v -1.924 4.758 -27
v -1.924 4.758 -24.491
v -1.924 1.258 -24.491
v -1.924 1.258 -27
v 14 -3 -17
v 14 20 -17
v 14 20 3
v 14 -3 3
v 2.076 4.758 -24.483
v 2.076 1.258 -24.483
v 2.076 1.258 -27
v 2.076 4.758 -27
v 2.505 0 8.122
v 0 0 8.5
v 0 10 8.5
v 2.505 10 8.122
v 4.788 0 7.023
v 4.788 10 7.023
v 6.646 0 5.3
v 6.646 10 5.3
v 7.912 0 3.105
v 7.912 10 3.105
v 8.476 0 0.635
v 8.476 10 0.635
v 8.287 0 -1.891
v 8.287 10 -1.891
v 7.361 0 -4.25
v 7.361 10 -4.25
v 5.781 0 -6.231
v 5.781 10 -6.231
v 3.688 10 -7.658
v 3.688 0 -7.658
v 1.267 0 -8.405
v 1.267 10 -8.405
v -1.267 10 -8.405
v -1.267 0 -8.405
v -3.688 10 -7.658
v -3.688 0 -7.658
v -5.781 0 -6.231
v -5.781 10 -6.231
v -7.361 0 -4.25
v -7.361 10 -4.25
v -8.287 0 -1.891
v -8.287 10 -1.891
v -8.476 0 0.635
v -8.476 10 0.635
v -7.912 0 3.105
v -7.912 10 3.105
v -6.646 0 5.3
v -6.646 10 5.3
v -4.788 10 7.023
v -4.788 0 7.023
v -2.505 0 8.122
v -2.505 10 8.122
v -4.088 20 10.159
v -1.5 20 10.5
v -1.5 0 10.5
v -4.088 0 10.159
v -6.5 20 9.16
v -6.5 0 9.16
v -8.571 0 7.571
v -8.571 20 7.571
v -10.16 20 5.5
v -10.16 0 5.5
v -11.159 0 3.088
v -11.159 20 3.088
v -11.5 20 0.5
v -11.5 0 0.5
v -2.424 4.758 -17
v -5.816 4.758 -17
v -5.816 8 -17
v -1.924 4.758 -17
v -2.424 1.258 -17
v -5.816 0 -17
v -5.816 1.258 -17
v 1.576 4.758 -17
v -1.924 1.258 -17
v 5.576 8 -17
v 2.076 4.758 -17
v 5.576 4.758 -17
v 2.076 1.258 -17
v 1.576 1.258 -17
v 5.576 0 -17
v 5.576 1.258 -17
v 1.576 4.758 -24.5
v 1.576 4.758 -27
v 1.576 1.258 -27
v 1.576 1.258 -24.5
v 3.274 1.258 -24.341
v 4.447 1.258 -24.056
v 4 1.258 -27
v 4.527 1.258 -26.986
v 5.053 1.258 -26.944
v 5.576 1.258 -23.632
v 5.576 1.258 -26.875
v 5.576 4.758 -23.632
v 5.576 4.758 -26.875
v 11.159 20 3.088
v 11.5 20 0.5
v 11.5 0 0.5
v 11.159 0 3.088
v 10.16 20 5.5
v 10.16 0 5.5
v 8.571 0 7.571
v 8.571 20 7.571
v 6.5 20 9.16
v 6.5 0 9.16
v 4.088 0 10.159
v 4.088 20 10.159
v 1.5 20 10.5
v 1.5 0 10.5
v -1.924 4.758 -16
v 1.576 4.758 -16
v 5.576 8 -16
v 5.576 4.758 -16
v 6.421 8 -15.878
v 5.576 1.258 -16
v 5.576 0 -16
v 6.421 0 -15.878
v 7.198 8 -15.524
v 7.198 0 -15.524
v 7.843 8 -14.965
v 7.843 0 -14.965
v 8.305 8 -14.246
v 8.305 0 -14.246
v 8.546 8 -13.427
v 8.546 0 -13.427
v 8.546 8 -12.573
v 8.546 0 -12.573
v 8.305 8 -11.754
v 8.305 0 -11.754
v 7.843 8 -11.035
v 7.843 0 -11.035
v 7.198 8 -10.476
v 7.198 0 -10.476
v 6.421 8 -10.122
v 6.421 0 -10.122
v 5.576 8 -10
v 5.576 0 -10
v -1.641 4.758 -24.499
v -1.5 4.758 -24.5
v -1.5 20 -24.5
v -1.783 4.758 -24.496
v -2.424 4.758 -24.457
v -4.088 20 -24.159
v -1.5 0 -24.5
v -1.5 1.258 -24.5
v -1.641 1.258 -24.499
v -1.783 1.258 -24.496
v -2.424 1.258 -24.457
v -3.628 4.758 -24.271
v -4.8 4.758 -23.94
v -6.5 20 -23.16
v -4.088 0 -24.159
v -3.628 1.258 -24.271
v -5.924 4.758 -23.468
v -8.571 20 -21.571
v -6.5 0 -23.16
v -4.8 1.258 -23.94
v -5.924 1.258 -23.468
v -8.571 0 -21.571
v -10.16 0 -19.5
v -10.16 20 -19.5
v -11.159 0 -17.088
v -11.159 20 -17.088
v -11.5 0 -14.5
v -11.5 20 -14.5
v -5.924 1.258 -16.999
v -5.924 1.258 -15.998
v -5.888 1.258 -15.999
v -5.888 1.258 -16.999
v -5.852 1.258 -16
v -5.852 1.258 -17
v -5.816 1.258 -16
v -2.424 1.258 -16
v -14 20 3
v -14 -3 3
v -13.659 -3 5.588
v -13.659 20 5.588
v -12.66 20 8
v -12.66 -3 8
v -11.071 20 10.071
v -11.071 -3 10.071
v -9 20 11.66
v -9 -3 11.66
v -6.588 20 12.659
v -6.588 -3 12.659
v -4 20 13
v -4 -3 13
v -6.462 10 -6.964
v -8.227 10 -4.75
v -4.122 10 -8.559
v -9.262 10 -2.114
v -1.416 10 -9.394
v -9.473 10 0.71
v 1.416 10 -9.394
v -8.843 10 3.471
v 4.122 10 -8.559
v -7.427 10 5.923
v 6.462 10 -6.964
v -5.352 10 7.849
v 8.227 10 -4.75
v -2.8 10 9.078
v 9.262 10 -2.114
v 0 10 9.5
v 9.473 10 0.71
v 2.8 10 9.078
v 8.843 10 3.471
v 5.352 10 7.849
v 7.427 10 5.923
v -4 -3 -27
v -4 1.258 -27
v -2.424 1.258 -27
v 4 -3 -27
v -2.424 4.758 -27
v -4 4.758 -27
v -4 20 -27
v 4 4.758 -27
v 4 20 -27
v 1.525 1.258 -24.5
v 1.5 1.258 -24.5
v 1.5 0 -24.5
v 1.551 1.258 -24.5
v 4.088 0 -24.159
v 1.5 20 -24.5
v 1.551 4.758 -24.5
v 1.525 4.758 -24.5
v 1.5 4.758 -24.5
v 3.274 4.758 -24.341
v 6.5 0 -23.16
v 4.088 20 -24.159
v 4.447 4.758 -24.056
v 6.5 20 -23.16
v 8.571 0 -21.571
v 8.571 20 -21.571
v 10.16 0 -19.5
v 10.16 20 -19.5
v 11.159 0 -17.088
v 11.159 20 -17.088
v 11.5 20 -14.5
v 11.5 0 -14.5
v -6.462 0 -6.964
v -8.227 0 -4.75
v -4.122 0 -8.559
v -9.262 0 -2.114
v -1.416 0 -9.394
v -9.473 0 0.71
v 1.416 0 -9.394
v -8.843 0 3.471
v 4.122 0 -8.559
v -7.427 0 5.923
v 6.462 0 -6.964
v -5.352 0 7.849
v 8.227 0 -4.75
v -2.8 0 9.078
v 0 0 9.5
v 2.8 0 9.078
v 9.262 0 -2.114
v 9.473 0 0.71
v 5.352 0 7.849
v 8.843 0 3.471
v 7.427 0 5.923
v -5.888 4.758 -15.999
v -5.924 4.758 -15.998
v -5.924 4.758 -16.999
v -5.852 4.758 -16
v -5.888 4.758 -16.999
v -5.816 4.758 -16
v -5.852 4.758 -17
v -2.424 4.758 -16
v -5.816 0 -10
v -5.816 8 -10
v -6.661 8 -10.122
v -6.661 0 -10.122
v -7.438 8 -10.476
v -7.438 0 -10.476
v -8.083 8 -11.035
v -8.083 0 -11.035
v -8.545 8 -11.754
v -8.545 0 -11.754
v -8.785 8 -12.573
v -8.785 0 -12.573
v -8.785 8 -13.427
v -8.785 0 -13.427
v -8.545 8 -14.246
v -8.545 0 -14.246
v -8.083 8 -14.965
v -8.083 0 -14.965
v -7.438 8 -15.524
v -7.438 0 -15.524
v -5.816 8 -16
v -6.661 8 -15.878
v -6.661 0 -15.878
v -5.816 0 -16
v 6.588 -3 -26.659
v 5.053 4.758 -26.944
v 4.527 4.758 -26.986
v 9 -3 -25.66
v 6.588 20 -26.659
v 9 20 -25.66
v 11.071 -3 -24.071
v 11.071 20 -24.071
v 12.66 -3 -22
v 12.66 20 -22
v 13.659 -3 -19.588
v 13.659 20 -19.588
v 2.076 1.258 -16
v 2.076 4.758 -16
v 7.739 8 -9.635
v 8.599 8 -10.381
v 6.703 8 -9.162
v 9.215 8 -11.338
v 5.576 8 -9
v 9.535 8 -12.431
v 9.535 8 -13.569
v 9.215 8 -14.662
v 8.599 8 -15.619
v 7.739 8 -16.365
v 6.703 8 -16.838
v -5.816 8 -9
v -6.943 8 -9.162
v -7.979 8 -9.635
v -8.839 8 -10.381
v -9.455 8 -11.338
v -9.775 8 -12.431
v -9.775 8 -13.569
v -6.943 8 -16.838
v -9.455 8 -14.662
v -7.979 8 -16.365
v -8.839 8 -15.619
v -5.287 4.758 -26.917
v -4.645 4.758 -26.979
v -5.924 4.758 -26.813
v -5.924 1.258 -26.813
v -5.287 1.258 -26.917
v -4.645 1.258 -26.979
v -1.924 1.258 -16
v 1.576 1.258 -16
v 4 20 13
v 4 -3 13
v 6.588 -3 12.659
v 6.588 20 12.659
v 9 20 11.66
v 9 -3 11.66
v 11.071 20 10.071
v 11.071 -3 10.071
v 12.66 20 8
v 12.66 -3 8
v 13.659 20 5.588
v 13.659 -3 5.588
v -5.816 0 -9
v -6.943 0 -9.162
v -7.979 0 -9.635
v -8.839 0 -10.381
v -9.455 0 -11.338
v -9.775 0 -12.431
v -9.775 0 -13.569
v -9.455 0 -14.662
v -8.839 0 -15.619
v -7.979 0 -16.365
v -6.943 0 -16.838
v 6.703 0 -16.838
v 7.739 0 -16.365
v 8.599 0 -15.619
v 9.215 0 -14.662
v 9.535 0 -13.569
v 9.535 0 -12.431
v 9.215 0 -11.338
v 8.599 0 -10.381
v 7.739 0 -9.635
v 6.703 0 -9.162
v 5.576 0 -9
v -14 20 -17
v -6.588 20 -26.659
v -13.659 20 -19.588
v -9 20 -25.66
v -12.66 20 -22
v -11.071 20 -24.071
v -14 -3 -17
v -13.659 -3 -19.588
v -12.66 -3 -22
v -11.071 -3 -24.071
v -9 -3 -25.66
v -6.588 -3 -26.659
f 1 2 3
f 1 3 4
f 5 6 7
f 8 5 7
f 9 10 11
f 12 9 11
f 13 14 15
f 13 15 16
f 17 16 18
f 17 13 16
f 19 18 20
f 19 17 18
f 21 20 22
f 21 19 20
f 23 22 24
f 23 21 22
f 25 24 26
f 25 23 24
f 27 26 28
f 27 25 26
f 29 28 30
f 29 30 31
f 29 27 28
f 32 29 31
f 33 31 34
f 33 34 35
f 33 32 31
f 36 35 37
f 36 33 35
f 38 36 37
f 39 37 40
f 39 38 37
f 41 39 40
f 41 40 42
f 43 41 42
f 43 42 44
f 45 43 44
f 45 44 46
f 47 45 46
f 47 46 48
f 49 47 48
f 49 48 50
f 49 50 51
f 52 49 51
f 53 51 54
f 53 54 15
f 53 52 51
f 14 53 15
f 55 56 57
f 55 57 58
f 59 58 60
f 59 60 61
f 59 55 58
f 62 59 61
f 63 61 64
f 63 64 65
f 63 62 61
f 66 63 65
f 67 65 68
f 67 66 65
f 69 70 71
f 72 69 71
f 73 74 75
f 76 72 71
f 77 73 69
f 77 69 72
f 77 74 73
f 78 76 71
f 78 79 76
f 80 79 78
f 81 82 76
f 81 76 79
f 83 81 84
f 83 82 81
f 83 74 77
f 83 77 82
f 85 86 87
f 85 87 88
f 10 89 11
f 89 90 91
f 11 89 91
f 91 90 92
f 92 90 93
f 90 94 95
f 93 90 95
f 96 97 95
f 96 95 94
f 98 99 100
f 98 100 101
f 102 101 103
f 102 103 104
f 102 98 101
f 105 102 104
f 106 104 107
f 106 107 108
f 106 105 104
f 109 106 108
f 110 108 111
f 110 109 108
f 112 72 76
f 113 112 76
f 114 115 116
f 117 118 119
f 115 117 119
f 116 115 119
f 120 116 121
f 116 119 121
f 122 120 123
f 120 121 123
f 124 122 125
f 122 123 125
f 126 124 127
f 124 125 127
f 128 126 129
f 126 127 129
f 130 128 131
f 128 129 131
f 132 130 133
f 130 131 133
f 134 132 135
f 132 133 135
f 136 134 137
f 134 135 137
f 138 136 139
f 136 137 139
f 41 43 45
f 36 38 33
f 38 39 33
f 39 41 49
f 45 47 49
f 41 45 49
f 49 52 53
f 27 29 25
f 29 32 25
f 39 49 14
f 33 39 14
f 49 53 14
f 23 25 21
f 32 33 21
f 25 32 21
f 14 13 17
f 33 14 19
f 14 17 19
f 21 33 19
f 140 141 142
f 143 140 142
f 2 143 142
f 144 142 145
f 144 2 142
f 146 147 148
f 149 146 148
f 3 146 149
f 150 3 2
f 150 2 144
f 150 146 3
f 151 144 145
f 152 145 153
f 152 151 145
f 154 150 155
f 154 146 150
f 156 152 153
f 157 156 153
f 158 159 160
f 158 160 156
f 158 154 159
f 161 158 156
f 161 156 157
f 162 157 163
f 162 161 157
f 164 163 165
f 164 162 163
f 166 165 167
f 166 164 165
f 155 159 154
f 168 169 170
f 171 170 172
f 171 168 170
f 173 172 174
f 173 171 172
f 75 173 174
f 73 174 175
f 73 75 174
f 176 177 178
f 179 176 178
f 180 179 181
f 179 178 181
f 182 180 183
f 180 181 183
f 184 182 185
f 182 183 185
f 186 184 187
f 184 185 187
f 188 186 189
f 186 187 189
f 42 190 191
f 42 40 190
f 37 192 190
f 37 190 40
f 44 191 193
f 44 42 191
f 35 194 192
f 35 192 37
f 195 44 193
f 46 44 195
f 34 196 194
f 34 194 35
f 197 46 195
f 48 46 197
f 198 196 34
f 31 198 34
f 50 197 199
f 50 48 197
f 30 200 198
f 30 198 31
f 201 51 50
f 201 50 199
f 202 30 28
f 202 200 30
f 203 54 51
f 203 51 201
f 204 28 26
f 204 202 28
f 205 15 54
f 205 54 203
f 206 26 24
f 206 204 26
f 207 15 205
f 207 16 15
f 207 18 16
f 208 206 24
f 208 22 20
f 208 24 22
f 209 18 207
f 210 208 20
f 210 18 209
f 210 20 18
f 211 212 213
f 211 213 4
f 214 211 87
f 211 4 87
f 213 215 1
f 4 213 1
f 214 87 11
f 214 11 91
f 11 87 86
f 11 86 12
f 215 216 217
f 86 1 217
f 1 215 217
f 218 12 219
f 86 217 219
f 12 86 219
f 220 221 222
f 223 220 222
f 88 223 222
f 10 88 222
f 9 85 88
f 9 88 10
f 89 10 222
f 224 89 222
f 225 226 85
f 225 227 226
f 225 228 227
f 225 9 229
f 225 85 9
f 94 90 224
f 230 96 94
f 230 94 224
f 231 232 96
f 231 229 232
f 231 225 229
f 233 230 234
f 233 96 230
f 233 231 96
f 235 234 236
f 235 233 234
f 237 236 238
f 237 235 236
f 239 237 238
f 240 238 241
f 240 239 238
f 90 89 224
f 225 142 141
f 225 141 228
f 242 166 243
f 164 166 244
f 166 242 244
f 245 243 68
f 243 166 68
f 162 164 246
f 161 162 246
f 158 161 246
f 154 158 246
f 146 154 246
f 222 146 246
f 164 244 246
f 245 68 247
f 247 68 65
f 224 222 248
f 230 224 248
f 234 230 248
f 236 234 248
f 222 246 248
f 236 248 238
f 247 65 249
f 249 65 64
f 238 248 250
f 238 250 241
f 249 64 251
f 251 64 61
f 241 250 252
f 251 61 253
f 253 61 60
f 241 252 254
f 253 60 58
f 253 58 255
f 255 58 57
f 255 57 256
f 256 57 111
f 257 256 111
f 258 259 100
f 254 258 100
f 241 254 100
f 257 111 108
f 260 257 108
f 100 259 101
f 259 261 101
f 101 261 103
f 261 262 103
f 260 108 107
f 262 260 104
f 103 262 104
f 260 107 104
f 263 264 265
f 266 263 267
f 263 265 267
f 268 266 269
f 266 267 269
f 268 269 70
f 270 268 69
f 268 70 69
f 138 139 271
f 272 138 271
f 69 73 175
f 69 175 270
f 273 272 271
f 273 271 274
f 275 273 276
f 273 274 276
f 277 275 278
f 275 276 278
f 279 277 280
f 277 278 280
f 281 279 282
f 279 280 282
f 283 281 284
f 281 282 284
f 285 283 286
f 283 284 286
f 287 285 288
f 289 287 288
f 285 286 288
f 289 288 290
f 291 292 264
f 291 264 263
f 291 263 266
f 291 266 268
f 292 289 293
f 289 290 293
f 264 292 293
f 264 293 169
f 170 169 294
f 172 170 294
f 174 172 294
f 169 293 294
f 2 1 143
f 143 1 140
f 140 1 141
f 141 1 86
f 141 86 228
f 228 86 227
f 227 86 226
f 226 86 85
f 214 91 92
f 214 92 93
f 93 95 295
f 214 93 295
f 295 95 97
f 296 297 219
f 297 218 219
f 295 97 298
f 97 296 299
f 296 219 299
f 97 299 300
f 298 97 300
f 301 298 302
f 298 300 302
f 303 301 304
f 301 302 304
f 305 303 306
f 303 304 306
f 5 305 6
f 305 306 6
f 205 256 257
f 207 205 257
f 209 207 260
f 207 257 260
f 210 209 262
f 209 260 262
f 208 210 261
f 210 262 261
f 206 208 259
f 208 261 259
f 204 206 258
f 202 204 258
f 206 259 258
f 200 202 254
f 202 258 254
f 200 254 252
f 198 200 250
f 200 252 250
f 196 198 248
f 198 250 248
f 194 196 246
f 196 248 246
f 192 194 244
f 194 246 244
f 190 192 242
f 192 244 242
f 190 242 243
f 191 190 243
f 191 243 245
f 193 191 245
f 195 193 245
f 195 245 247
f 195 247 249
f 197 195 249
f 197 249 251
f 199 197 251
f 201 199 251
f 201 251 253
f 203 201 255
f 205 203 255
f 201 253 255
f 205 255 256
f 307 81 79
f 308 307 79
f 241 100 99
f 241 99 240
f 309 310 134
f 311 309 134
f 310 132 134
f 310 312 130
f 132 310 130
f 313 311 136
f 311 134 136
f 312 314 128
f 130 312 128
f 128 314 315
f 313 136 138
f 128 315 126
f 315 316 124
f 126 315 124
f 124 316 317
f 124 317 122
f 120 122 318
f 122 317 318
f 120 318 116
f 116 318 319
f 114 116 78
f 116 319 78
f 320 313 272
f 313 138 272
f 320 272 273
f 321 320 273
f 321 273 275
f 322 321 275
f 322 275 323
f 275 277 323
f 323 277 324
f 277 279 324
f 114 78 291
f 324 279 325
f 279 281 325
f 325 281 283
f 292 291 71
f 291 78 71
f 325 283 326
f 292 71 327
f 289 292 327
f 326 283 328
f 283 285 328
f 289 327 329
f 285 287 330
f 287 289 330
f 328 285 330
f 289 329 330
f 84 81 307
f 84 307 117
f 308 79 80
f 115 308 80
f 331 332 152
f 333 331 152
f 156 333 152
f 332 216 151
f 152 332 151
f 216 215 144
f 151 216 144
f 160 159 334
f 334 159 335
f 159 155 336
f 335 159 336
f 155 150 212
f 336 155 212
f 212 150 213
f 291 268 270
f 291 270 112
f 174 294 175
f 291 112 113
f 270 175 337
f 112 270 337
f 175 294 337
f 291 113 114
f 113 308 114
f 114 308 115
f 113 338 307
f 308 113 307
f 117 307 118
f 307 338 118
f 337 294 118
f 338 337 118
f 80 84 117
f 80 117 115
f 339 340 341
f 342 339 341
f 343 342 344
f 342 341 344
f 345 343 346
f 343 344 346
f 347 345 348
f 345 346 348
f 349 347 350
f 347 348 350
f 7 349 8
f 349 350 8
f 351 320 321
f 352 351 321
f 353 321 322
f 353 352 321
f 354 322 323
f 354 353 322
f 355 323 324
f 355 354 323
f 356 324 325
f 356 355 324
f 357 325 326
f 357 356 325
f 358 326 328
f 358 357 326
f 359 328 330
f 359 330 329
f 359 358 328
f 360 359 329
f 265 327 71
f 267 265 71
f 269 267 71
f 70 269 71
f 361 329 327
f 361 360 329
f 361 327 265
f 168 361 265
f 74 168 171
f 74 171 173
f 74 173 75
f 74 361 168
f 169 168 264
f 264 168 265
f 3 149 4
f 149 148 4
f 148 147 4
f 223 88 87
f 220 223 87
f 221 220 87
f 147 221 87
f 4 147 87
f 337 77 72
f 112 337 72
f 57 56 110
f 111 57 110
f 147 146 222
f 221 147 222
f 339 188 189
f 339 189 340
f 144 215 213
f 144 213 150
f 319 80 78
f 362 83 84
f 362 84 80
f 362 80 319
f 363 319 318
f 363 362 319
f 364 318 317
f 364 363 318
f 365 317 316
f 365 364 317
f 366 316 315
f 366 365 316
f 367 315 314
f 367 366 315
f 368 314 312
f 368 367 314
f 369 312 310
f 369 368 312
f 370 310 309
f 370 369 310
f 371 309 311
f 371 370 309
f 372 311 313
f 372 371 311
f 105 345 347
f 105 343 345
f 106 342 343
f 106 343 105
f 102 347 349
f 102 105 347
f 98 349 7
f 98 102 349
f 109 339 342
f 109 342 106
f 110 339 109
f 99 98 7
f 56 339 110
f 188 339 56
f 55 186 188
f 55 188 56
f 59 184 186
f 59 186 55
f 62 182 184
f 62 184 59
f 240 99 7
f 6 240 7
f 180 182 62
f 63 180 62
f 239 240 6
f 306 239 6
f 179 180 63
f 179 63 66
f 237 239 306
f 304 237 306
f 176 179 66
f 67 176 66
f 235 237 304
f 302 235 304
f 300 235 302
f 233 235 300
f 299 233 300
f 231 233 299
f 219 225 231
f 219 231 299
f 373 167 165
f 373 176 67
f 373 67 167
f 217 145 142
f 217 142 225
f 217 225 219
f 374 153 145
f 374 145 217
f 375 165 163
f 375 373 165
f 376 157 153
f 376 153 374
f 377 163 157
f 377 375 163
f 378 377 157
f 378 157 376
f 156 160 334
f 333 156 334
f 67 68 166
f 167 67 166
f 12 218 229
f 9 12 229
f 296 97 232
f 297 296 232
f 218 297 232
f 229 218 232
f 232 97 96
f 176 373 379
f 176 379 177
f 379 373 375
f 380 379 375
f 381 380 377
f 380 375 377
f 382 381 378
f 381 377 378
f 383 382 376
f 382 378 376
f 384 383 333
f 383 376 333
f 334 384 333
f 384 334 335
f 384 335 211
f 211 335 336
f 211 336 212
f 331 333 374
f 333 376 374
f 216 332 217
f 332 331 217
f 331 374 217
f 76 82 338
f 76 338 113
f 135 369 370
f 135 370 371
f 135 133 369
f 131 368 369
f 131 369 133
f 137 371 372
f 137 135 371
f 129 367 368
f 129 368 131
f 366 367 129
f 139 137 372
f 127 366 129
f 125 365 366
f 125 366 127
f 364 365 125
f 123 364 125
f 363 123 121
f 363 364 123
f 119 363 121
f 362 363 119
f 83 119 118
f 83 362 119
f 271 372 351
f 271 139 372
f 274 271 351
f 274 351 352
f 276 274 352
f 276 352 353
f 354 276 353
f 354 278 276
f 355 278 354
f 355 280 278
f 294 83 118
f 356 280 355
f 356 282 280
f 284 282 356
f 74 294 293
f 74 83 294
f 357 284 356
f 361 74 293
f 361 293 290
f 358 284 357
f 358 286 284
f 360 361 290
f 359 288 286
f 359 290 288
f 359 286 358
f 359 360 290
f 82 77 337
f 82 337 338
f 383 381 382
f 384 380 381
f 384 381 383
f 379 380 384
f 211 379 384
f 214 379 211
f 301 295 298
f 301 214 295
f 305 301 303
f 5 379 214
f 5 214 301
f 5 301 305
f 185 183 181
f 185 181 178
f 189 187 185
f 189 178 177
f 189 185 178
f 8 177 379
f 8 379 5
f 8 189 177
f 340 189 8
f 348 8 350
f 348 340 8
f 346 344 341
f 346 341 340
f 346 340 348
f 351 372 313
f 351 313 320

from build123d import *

# Parameters (mm, degrees)
SKETCH1_W               = 28
SKETCH1_H               = 40
SKETCH1_W_2             = 23
SKETCH1_H_2             = 35
BOSS_EXTRUDE4_DEPTH     = 10
SKETCH1_R               = 9.5
SKETCH1_R_2             = 8.5
BOSS_EXTRUDE4_2_DEPTH   = 10
SKETCH1_5_W             = 28
SKETCH1_5_H             = 40
SKETCH1_5_W_2           = 23
SKETCH1_5_H_2           = 35
BOSS_EXTRUDE5_DEPTH     = 20
SKETCH3_W               = 28
SKETCH3_H               = 40
BOSS_EXTRUDE6_DEPTH     = 3
BOSS_EXTRUDE9_DEPTH     = 8
CUT_EXTRUDE2_DEPTH      = 11
CUT_EXTRUDE2_DEPTH_BACK = 8
SKETCH6_W               = 3.5
SKETCH6_H               = 3.5
FILLET1_R               = 10


with BuildPart() as part:
    # Sketch1 → Boss-Extrude4 (new body)
    with BuildSketch(Plane(origin=(0, 0, 0), x_dir=(1, 0, 0), z_dir=(0, 1, 0))):
        with Locations((0, 7)):
            Rectangle(SKETCH1_W, SKETCH1_H)
        with Locations((0, 7)):
            Rectangle(SKETCH1_W_2, SKETCH1_H_2, mode=Mode.SUBTRACT)
    extrude(amount=BOSS_EXTRUDE4_DEPTH)

    # Sketch1<5> → Boss-Extrude5 (add)
    with BuildSketch(Plane(origin=(0, 0, 0), x_dir=(1, 0, 0), z_dir=(0, 1, 0))):
        with Locations((0, 7)):
            Rectangle(SKETCH1_5_W, SKETCH1_5_H)
        with Locations((0, 7)):
            Rectangle(SKETCH1_5_W_2, SKETCH1_5_H_2, mode=Mode.SUBTRACT)
    extrude(amount=BOSS_EXTRUDE5_DEPTH)



with BuildPart() as body_2:
    # Sketch1 → Boss-Extrude4 2 (new body)
    with BuildSketch(Plane(origin=(0, 0, 0), x_dir=(1, 0, 0), z_dir=(0, 1, 0))):
        with Locations(Location((0, 0, 0), (0, 0, 270))):
            Circle(SKETCH1_R)
        with Locations(Location((0, 0, 0), (0, 0, 270))):
            Circle(SKETCH1_R_2, mode=Mode.SUBTRACT)
    extrude(amount=BOSS_EXTRUDE4_2_DEPTH)


with BuildPart() as part_1:
    add(part.part)

    add(body_2.part)  # Boss-Extrude6 merges body 2
    # Sketch3 → Boss-Extrude6 (add)
    with BuildSketch(Plane.XZ):
        with Locations((0, -7)):
            Rectangle(SKETCH3_W, SKETCH3_H)
    extrude(amount=BOSS_EXTRUDE6_DEPTH)


with BuildPart() as body_2_2:
    # Sketch4 → Boss-Extrude9 (new body)
    with BuildSketch(Plane(origin=(0, 0, 0), x_dir=(1, 0, 0), z_dir=(0, 1, 0))):
        with BuildLine():
            Line((-5.815986723, 17), (5.576152219, 17))
            ThreePointArc((5.576152219, 17), (9.576152219, 13), (5.576152219, 9))
            Line((5.576152219, 9), (-5.815986723, 9))
            ThreePointArc((-5.815986723, 9), (-9.815986723, 13), (-5.815986723, 17))
        make_face()
        with BuildLine():
            Line((-5.815986723, 16), (5.576152219, 16))
            ThreePointArc((5.576152219, 16), (8.576152219, 13), (5.576152219, 10))
            Line((5.576152219, 10), (-5.815986723, 10))
            ThreePointArc((-5.815986723, 10), (-8.815986723, 13), (-5.815986723, 16))
        make_face(mode=Mode.SUBTRACT)
    extrude(amount=BOSS_EXTRUDE9_DEPTH)


with BuildPart() as cut_extrude2_tool:
    # Sketch6 → Cut-Extrude2 (new, two sides: drawn at the far end of the back side and taken through both)
    with BuildSketch(Plane.XY.offset(-24.5).offset(-CUT_EXTRUDE2_DEPTH_BACK)):
        with Locations((3.826152219, 3.007864186)):
            Rectangle(SKETCH6_W, SKETCH6_H)
        with Locations((-0.173847781, 3.007864186)):
            Rectangle(SKETCH6_W, SKETCH6_H)
        with Locations((-4.173847781, 3.007864186)):
            Rectangle(SKETCH6_W, SKETCH6_H)
    extrude(amount=CUT_EXTRUDE2_DEPTH + CUT_EXTRUDE2_DEPTH_BACK)


with BuildPart() as part_2:
    add(part_1.part)

    # Cut-Extrude2: cut by cut_extrude2_tool
    add(cut_extrude2_tool.part, mode=Mode.SUBTRACT)

    # Fillet1
    # the kernel refuses this fillet: 10 mm, written as the material it adds along each edge
    with BuildSketch(Plane(origin=(-11.5, 20, 10.5), x_dir=(0, 0, -1), z_dir=(0, -1, 0)), Plane(origin=(11.5, 20, 10.5), x_dir=(-1, 0, 0), z_dir=(0, -1, 0))) as fillet1_piece_1:
        with BuildLine():
            CenterArc((FILLET1_R, FILLET1_R), FILLET1_R, 180, 90)
            Line((0, FILLET1_R), (0, 0))
            Line((0, 0), (FILLET1_R, 0))
        make_face()
    extrude(amount=20)
    with BuildSketch(Plane(origin=(11.5, 20, -24.5), x_dir=(0, 0, 1), z_dir=(0, -1, 0))) as fillet1_piece_2_section:
        with BuildLine():
            CenterArc((FILLET1_R, FILLET1_R), FILLET1_R, 180, 90)
            Line((0, FILLET1_R), (0, 0))
            Line((0, 0), (FILLET1_R, 0))
        make_face()
    fillet1_piece_2 = extrude(amount=45, mode=Mode.PRIVATE)
    fillet1_piece_2 = split(fillet1_piece_2, bisect_by=Plane(origin=(9.534581137, 4.757864186, -22.153586086), z_dir=(0, 1, 0)), keep=Keep.TOP, mode=Mode.PRIVATE)
    add(fillet1_piece_2)
    with BuildSketch(Plane(origin=(11.5, 45, -24.5), x_dir=(0, 0, 1), z_dir=(0, -1, 0))) as fillet1_piece_3_section:
        with BuildLine():
            CenterArc((FILLET1_R, FILLET1_R), FILLET1_R, 180, 90)
            Line((0, FILLET1_R), (0, 0))
            Line((0, 0), (FILLET1_R, 0))
        make_face()
    fillet1_piece_3 = extrude(amount=45, mode=Mode.PRIVATE)
    fillet1_piece_3 = split(fillet1_piece_3, bisect_by=Plane(origin=(9.534581137, 4.757864186, -22.153586086), z_dir=(0, -1, 0)), keep=Keep.TOP, mode=Mode.PRIVATE)
    fillet1_piece_3 = split(fillet1_piece_3, bisect_by=Plane(origin=(5.576152219, 3.007864186, -22.153586086), z_dir=(1, 0, 0)), keep=Keep.TOP, mode=Mode.PRIVATE)
    add(fillet1_piece_3)
    with BuildSketch(Plane(origin=(11.5, 45, -24.5), x_dir=(0, 0, 1), z_dir=(0, -1, 0))) as fillet1_piece_4_section:
        with BuildLine():
            CenterArc((FILLET1_R, FILLET1_R), FILLET1_R, 180, 90)
            Line((0, FILLET1_R), (0, 0))
            Line((0, 0), (FILLET1_R, 0))
        make_face()
    fillet1_piece_4 = extrude(amount=45, mode=Mode.PRIVATE)
    fillet1_piece_4 = split(fillet1_piece_4, bisect_by=Plane(origin=(1.933005634, 4.757864186, -24.495005975), z_dir=(0, -1, 0)), keep=Keep.TOP, mode=Mode.PRIVATE)
    fillet1_piece_4 = split(fillet1_piece_4, bisect_by=Plane(origin=(2.076152219, 3.007864186, -24.495005975), z_dir=(-1, 0, 0)), keep=Keep.TOP, mode=Mode.PRIVATE)
    fillet1_piece_4 = split(fillet1_piece_4, bisect_by=Plane(origin=(1.576152219, 3.007864186, -24.495005975), z_dir=(1, 0, 0)), keep=Keep.TOP, mode=Mode.PRIVATE)
    add(fillet1_piece_4)
    with BuildSketch(Plane(origin=(11.5, 45, -24.5), x_dir=(0, 0, 1), z_dir=(0, -1, 0))) as fillet1_piece_5_section:
        with BuildLine():
            CenterArc((FILLET1_R, FILLET1_R), FILLET1_R, 180, 90)
            Line((0, FILLET1_R), (0, 0))
            Line((0, 0), (FILLET1_R, 0))
        make_face()
    fillet1_piece_5 = extrude(amount=45, mode=Mode.PRIVATE)
    fillet1_piece_5 = split(fillet1_piece_5, bisect_by=Plane(origin=(4.573444491, 1.257864186, -24.240822934), z_dir=(0, -1, 0)), keep=Keep.TOP, mode=Mode.PRIVATE)
    add(fillet1_piece_5)
    with BuildSketch(Plane(origin=(-11.5, 0, -24.5), x_dir=(0, 0, 1), z_dir=(0, 1, 0))) as fillet1_piece_6_section:
        with BuildLine():
            CenterArc((FILLET1_R, FILLET1_R), FILLET1_R, 180, 90)
            Line((0, FILLET1_R), (0, 0))
            Line((0, 0), (FILLET1_R, 0))
        make_face()
    fillet1_piece_6 = extrude(amount=45, mode=Mode.PRIVATE)
    fillet1_piece_6 = split(fillet1_piece_6, bisect_by=Plane(origin=(-9.597009407, 1.257864186, -22.122684576), z_dir=(0, -1, 0)), keep=Keep.TOP, mode=Mode.PRIVATE)
    add(fillet1_piece_6)
    with BuildSketch(Plane(origin=(-11.5, 0, -24.5), x_dir=(0, 0, 1), z_dir=(0, 1, 0))) as fillet1_piece_7_section:
        with BuildLine():
            CenterArc((FILLET1_R, FILLET1_R), FILLET1_R, 180, 90)
            Line((0, FILLET1_R), (0, 0))
            Line((0, 0), (FILLET1_R, 0))
        make_face()
    fillet1_piece_7 = extrude(amount=20, mode=Mode.PRIVATE)
    fillet1_piece_7 = split(fillet1_piece_7, bisect_by=Plane(origin=(-5.923847781, 3.007864186, -22.122684576), z_dir=(-1, 0, 0)), keep=Keep.TOP, mode=Mode.PRIVATE)
    add(fillet1_piece_7)
    with BuildSketch(Plane(origin=(-11.5, 0, -24.5), x_dir=(0, 0, 1), z_dir=(0, 1, 0))) as fillet1_piece_8_section:
        with BuildLine():
            CenterArc((FILLET1_R, FILLET1_R), FILLET1_R, 180, 90)
            Line((0, FILLET1_R), (0, 0))
            Line((0, 0), (FILLET1_R, 0))
        make_face()
    fillet1_piece_8 = extrude(amount=20, mode=Mode.PRIVATE)
    fillet1_piece_8 = split(fillet1_piece_8, bisect_by=Plane(origin=(-2.423847781, 3.007864186, -24.486093352), z_dir=(1, 0, 0)), keep=Keep.TOP, mode=Mode.PRIVATE)
    fillet1_piece_8 = split(fillet1_piece_8, bisect_by=Plane(origin=(-1.923847781, 3.007864186, -24.486093352), z_dir=(-1, 0, 0)), keep=Keep.TOP, mode=Mode.PRIVATE)
    add(fillet1_piece_8)
    with BuildSketch(Plane(origin=(-11.5, -25, -24.5), x_dir=(0, 0, 1), z_dir=(0, 1, 0))) as fillet1_piece_9_section:
        with BuildLine():
            CenterArc((FILLET1_R, FILLET1_R), FILLET1_R, 180, 90)
            Line((0, FILLET1_R), (0, 0))
            Line((0, 0), (FILLET1_R, 0))
        make_face()
    fillet1_piece_9 = extrude(amount=45, mode=Mode.PRIVATE)
    fillet1_piece_9 = split(fillet1_piece_9, bisect_by=Plane(origin=(-4.853134355, 4.757864186, -24.190800043), z_dir=(0, 1, 0)), keep=Keep.TOP, mode=Mode.PRIVATE)
    add(fillet1_piece_9)
    # the kernel refuses this fillet: 10 mm, written as the material it takes off along each edge
    with BuildSketch(Plane(origin=(-14, 45, -27), x_dir=(0, 0, 1), z_dir=(0, -1, 0)), Plane(origin=(14, -28, 13), x_dir=(-1, 0, 0), z_dir=(0, 1, 0)), Plane(origin=(-14, -28, 13), x_dir=(0, 0, -1), z_dir=(0, 1, 0))) as fillet1_2_piece_1:
        with BuildLine():
            CenterArc((FILLET1_R, -FILLET1_R), FILLET1_R, 90, 90)
            Line((0, -FILLET1_R), (0, 0))
            Line((0, 0), (FILLET1_R, 0))
        make_face()
    extrude(amount=73, mode=Mode.SUBTRACT)
    with BuildSketch(Plane(origin=(14, 45, -27), x_dir=(0, 0, 1), z_dir=(0, -1, 0))) as fillet1_2_piece_2:
        with BuildLine():
            CenterArc((FILLET1_R, FILLET1_R), FILLET1_R, 180, 90)
            Line((0, FILLET1_R), (0, 0))
            Line((0, 0), (FILLET1_R, 0))
        make_face()
    extrude(amount=73, mode=Mode.SUBTRACT)


with BuildPart() as body_2_2_1:
    add(body_2_2.part)

    # Cut-Extrude2: cut by cut_extrude2_tool
    add(cut_extrude2_tool.part, mode=Mode.SUBTRACT)


solid = Compound([part_2.part, body_2_2_1.part])
